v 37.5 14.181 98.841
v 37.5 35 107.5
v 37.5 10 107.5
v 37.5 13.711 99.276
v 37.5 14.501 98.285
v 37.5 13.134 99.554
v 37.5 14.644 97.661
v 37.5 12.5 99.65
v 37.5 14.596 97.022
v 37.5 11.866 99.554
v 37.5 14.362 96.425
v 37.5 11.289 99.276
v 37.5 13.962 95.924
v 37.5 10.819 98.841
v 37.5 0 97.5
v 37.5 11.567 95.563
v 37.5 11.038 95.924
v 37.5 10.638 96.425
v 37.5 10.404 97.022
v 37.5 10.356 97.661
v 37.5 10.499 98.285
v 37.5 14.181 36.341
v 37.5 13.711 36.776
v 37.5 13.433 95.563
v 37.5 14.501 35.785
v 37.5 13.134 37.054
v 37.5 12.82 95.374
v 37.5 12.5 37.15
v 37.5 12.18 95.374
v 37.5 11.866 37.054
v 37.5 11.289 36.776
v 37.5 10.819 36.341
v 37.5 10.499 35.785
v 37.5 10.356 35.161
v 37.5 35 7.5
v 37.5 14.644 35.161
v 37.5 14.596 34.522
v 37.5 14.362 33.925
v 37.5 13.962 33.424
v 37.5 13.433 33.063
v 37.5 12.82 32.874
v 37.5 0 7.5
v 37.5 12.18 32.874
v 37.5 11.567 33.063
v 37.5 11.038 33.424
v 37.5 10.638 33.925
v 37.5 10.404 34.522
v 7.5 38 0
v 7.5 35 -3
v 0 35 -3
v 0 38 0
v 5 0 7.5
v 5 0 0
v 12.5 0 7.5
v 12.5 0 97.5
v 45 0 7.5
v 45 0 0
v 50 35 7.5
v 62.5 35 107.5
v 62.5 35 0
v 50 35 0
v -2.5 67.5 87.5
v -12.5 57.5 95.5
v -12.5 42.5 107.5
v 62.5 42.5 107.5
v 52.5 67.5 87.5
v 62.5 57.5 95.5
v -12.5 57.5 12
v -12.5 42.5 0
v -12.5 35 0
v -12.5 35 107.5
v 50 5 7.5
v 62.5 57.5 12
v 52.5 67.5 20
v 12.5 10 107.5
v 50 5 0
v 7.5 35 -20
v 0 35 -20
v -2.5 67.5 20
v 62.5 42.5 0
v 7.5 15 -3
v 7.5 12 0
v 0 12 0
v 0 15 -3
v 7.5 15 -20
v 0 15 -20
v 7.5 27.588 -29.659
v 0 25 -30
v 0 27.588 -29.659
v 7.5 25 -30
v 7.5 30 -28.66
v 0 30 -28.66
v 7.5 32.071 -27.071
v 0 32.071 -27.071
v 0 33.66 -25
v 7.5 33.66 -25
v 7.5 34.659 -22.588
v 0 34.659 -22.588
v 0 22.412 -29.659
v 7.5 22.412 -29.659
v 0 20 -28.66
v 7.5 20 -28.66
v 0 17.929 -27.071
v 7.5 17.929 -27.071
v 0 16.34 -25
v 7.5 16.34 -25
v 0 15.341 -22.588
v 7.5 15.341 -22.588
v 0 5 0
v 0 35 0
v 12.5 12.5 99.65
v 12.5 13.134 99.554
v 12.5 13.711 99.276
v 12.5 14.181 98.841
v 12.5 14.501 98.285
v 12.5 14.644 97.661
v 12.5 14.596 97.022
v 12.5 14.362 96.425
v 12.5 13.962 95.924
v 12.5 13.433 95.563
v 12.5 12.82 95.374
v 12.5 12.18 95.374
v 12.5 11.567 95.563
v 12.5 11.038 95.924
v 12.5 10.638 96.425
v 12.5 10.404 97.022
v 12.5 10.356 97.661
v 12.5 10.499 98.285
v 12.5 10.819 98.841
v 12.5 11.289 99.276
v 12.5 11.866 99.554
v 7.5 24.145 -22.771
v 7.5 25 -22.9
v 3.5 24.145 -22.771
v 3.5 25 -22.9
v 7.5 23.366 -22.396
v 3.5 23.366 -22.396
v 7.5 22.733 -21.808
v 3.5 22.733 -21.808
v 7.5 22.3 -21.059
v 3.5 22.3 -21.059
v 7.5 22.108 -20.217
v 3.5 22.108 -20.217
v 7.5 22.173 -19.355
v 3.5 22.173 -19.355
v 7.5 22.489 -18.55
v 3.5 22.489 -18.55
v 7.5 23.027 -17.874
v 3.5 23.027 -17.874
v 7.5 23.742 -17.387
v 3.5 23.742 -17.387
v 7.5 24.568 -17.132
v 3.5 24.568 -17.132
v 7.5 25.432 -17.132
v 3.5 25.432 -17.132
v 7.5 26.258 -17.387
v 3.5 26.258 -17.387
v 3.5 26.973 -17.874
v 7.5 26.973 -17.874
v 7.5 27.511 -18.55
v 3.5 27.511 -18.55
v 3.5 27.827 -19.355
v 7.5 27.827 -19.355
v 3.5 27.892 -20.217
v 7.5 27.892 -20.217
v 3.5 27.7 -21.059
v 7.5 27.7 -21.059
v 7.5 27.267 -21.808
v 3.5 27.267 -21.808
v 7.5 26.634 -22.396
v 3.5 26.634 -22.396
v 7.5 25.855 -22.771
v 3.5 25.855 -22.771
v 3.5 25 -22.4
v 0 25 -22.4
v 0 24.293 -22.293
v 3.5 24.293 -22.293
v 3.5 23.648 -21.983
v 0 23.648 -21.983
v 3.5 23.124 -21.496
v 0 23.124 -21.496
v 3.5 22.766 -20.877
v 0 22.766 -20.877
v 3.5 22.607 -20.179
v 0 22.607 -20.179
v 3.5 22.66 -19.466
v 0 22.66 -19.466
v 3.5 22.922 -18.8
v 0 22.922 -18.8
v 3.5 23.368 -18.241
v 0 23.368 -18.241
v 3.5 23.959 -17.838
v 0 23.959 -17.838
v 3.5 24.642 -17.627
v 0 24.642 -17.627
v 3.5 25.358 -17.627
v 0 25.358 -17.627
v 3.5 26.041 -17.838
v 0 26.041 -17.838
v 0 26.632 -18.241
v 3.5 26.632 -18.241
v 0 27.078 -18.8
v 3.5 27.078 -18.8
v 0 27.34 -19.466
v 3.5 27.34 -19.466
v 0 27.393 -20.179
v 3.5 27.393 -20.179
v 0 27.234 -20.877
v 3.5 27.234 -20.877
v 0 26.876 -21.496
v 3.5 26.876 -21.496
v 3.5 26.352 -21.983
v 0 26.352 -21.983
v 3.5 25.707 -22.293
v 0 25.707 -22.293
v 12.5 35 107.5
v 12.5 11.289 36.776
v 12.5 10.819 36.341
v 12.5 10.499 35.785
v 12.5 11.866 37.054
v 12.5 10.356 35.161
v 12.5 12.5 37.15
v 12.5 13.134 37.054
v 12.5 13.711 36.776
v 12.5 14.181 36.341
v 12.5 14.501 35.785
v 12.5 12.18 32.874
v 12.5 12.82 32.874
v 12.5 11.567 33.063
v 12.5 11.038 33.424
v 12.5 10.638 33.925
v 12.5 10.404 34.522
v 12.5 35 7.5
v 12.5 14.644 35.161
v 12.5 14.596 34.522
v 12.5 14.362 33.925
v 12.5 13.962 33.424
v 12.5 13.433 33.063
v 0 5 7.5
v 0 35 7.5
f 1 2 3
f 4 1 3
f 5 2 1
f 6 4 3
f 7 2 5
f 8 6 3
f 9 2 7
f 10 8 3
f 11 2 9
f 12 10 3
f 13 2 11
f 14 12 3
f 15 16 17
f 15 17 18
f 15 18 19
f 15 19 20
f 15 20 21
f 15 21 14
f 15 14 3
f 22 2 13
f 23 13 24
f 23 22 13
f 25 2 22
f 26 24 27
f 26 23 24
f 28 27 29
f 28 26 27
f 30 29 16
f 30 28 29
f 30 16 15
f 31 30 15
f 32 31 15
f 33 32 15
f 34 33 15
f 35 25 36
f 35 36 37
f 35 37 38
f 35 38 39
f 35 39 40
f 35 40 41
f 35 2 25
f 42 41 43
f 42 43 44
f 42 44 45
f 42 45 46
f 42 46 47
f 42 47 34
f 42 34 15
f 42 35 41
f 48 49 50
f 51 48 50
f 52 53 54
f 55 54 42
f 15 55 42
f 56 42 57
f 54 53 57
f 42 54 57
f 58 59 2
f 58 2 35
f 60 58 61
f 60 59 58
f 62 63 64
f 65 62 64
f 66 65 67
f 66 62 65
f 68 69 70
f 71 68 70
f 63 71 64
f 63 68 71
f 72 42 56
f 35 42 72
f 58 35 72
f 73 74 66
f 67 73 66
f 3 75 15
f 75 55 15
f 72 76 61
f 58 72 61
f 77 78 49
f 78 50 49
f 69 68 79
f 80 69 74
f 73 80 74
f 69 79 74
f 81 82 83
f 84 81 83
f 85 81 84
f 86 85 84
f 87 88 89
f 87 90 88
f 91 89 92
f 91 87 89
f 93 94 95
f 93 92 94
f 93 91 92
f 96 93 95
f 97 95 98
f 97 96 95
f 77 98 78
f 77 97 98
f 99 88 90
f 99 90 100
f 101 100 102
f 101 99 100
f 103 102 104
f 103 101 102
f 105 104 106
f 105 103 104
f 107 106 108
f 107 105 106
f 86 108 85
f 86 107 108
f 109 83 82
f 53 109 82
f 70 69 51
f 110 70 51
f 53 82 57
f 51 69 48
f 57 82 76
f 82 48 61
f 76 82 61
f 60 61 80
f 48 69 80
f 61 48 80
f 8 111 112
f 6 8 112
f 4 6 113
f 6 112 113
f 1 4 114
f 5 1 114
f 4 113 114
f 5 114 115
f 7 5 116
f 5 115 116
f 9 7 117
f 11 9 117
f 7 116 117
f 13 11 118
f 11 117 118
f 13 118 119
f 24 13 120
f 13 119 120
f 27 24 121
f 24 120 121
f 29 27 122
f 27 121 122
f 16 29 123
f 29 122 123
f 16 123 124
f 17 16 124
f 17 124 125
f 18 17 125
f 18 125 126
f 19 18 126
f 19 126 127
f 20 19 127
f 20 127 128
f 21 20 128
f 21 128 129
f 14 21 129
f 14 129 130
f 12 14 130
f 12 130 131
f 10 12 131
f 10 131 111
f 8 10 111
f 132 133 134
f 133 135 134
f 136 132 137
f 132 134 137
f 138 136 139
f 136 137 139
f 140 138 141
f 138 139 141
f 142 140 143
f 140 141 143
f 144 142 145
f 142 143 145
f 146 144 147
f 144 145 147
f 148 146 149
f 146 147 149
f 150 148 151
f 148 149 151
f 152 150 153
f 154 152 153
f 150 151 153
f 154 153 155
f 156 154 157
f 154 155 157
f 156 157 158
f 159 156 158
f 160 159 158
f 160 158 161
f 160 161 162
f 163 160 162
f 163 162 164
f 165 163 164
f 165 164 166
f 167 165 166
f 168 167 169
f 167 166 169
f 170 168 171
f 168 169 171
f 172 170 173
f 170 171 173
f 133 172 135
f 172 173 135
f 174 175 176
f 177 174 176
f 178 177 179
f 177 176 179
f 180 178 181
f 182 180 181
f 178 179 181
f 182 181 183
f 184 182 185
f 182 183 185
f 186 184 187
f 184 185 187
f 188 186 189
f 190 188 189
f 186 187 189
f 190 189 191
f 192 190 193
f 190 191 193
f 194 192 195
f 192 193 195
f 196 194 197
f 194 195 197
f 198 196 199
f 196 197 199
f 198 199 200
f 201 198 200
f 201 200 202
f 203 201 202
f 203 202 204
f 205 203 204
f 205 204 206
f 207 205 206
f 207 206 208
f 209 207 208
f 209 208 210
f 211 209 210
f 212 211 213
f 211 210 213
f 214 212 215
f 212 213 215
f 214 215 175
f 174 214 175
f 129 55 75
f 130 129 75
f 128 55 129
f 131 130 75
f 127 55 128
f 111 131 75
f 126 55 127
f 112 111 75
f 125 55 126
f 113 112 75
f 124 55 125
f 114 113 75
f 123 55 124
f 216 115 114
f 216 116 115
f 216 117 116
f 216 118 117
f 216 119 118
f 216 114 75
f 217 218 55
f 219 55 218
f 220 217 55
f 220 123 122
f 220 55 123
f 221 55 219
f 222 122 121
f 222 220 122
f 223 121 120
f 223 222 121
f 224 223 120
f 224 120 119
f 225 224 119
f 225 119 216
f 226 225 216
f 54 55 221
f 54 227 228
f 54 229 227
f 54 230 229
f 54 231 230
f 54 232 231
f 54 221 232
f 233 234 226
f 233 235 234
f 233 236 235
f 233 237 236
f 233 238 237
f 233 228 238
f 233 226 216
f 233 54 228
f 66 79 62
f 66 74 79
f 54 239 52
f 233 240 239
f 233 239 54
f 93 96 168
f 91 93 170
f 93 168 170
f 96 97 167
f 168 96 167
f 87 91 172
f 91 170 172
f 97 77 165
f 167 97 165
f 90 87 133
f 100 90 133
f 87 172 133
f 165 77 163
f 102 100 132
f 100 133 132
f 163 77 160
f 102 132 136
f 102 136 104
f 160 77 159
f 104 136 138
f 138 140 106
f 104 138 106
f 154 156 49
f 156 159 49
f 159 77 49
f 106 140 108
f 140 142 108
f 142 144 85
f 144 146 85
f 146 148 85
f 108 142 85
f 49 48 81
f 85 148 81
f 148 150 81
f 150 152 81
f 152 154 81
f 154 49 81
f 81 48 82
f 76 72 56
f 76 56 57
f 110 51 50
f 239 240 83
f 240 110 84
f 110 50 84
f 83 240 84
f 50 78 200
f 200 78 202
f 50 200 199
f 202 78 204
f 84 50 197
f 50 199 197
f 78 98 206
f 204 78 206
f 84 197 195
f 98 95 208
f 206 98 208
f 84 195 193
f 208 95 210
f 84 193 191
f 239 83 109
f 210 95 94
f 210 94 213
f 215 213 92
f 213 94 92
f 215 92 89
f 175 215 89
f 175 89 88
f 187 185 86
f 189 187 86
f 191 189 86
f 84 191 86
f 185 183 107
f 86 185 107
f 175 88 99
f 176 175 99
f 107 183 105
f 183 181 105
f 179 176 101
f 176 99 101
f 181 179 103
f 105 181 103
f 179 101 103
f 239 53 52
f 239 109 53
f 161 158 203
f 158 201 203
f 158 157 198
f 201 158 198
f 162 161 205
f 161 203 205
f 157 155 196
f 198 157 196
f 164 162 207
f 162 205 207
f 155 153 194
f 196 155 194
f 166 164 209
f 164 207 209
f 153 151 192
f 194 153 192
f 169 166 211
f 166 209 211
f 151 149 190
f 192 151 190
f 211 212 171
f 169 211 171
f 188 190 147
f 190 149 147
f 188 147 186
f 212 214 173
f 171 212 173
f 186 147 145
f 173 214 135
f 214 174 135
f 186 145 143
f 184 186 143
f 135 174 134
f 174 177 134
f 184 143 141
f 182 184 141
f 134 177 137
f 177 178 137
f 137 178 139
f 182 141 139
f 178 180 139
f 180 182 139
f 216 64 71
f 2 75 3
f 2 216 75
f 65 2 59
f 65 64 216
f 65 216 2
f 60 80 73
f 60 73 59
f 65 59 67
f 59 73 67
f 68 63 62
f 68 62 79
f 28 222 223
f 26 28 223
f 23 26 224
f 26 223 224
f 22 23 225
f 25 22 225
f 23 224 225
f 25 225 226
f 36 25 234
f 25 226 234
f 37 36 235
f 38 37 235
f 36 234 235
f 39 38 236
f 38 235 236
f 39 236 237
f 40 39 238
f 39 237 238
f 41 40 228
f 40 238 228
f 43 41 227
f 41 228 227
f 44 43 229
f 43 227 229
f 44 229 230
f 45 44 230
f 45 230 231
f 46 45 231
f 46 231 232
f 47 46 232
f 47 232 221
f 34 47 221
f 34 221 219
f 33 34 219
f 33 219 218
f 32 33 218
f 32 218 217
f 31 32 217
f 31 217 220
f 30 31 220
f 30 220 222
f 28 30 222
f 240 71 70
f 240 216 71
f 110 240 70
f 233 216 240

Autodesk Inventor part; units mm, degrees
ref_plane "YZ Plane" through (0, 0, 0) normal (1, 0, 0) x (0, 1, 0)
ref_plane "XZ Plane" through (0, 0, 0) normal (0, 1, 0) x (-1, 0, 0)
ref_plane "XY Plane" through (0, 0, 0) normal (0, 0, 1) x (1, 0, 0)
sketch "Sketch1" plane through (0, 0, 0) normal (0, 0, 1) x (1, 0, 0)
  line L0 (0, 0) -> (50, 0)
  line L1 (50, 0) -> (50, 42.5)
  line L2 (50, 42.5) -> (0, 42.5)
  line L3 (0, 42.5) -> (0, 0)
  dimension "d0" = 50
  dimension "d1" = 42.5
extrude "Extrusion1" add sketch "Sketch1" along normal blind 7.5
sketch "Sketch2" plane through (0, 0, 0) normal (0, 0, -1) x (-1, 0, 0)
  line L0 (0, 42.5) -> (0, 0) projected
  line L1 (0, 35) -> (-7.5, 35)
  line L2 (-7.5, 35) -> (-7.5, 15)
  line L3 (-7.5, 15) -> (0, 15)
  line L4 (0, 15) -> (0, 35)
  line L5 (-50, 42.5) -> (0, 42.5) projected
  line L6 (0, 0) -> (-50, 0) projected
  point P0 (0, 15)
  dimension "d4" = 7.5
  dimension "d5" = 20
  dimension "d55" = 15
extrude "Extrusion2" add sketch "Sketch2" along normal blind 30
fillet "Fillet1" radius 10 2 edges at (3.75, 35, -30) (3.75, 15, -30)
sketch "Sketch3" plane through (7.5, 15, 0) normal (1, 0, 0) x (0, 0, -1)
  arc A0 (20, 0) -> (20, 20) centre (20, 10) ccw projected
  line L0 (30, 10) -> (20, 10) construction
  point P0 (0, -15)
hole "Hole1" at (7.5, 25, -20) direction (-1, 0, 0) diameter 4.8 end through all counterbore diameter 5.8 counterbore depth 4
chamfer "Chamfer1" distance 3 angle 45 2 edges at (3.75, 35, 0) (3.75, 15, 0)
sketch "Sketch6" plane through (0, 0, 7.5) normal (0, 0, 1) x (1, 0, 0)
  line L0 (50, 42.5) -> (0, 42.5) projected
  line L1 (25, 42.5) -> (25, -7.5) construction
  line L2 (12.5, 0) -> (12.5, 42.5)
  line L3 (12.5, 42.5) -> (37.5, 42.5)
  line L4 (37.5, 42.5) -> (37.5, 0)
  line L5 (37.5, 0) -> (12.5, 0)
  point P0 (0, 0)
  point P1 (45, 50)
  point P2 (5, 50)
  point P3 (0, 42.5)
  dimension "d43" = 50
  dimension "d44" = 42.5
  dimension "d45" = 25
  dimension "d46" = 42.5
  dimension "d47" = 12.5
extrude "Extrusion5" add sketch "Sketch6" along normal blind 100
sketch "Sketch10" plane through (12.5, 0, 7.5) normal (-1, 0, 0) x (0, 0, 1)
  line L0 (100, 42.5) -> (100, 0) projected
  line L1 (100, 35) -> (-7.5, 35)
  line L2 (-7.5, 35) -> (-7.5, 67.5)
  line L3 (-7.5, 67.5) -> (100, 67.5)
  line L4 (100, 67.5) -> (100, 35)
  line L5 (0, 42.5) -> (100, 42.5) projected
  point P0 (-7.5, 0)
  dimension "d66" = 107.5
  dimension "d67" = 32.5
  dimension "d68" = 7.5
extrude "Extrusion9" add sketch "Sketch10" along normal blind 25 and the other way blind 50
chamfer "Chamfer3" distance 25 distance2 20 1 edges at (25, 67.5, 0) measured on face at (19.1667, 57.6667, 0)
chamfer "Chamfer4" distance 25 distance2 20 1 edges at (25, 67.5, 107.5) measured on face at (20.8333, 56.6667, 107.5)
chamfer "Chamfer5" distance 10 angle 45 2 edges at (-12.5, 67.5, 53.75) (62.5, 67.5, 53.75)
chamfer "Chamfer6" distance 10 angle 45 1 edges at (25, 0, 107.5)
chamfer "Chamfer7" distance 5 angle 45 2 edges at (0, 0, 3.75) (50, 0, 3.75)
sketch "Sketch11" plane through (12.5, 0, 7.5) normal (-1, 0, 0) x (0, 0, 1)
  line L0 (0, 5) -> (0, 35) projected
  line L1 (0, 12.5) -> (100, 12.5) construction
  line L2 (0, 12.5) -> (100, 12.5) construction
  line L3 (0, 0) -> (90, 0) projected
  line L4 (100, 35) -> (0, 35) projected
  line L5 (27.5, 35) -> (27.5, 0) construction
  line L6 (90, 0) -> (90, 35) construction
  line L7 (100, 35) -> (100, 10) projected
  circle A0 centre (27.5, 12.5) radius 2.15
  circle A1 centre (90, 12.5) radius 2.15
  point P0 (-7.5, 0)
  dimension "d88" = 100
  dimension "d90" = 12.5
  dimension "d91" = 27.5
  dimension "d92" = 10
  dimension "d93" = 4.3
  dimension "d94" = 4.3
extrude "Extrusion10" cut sketch "Sketch11" against normal through all
properties part number "ES117_Head"
